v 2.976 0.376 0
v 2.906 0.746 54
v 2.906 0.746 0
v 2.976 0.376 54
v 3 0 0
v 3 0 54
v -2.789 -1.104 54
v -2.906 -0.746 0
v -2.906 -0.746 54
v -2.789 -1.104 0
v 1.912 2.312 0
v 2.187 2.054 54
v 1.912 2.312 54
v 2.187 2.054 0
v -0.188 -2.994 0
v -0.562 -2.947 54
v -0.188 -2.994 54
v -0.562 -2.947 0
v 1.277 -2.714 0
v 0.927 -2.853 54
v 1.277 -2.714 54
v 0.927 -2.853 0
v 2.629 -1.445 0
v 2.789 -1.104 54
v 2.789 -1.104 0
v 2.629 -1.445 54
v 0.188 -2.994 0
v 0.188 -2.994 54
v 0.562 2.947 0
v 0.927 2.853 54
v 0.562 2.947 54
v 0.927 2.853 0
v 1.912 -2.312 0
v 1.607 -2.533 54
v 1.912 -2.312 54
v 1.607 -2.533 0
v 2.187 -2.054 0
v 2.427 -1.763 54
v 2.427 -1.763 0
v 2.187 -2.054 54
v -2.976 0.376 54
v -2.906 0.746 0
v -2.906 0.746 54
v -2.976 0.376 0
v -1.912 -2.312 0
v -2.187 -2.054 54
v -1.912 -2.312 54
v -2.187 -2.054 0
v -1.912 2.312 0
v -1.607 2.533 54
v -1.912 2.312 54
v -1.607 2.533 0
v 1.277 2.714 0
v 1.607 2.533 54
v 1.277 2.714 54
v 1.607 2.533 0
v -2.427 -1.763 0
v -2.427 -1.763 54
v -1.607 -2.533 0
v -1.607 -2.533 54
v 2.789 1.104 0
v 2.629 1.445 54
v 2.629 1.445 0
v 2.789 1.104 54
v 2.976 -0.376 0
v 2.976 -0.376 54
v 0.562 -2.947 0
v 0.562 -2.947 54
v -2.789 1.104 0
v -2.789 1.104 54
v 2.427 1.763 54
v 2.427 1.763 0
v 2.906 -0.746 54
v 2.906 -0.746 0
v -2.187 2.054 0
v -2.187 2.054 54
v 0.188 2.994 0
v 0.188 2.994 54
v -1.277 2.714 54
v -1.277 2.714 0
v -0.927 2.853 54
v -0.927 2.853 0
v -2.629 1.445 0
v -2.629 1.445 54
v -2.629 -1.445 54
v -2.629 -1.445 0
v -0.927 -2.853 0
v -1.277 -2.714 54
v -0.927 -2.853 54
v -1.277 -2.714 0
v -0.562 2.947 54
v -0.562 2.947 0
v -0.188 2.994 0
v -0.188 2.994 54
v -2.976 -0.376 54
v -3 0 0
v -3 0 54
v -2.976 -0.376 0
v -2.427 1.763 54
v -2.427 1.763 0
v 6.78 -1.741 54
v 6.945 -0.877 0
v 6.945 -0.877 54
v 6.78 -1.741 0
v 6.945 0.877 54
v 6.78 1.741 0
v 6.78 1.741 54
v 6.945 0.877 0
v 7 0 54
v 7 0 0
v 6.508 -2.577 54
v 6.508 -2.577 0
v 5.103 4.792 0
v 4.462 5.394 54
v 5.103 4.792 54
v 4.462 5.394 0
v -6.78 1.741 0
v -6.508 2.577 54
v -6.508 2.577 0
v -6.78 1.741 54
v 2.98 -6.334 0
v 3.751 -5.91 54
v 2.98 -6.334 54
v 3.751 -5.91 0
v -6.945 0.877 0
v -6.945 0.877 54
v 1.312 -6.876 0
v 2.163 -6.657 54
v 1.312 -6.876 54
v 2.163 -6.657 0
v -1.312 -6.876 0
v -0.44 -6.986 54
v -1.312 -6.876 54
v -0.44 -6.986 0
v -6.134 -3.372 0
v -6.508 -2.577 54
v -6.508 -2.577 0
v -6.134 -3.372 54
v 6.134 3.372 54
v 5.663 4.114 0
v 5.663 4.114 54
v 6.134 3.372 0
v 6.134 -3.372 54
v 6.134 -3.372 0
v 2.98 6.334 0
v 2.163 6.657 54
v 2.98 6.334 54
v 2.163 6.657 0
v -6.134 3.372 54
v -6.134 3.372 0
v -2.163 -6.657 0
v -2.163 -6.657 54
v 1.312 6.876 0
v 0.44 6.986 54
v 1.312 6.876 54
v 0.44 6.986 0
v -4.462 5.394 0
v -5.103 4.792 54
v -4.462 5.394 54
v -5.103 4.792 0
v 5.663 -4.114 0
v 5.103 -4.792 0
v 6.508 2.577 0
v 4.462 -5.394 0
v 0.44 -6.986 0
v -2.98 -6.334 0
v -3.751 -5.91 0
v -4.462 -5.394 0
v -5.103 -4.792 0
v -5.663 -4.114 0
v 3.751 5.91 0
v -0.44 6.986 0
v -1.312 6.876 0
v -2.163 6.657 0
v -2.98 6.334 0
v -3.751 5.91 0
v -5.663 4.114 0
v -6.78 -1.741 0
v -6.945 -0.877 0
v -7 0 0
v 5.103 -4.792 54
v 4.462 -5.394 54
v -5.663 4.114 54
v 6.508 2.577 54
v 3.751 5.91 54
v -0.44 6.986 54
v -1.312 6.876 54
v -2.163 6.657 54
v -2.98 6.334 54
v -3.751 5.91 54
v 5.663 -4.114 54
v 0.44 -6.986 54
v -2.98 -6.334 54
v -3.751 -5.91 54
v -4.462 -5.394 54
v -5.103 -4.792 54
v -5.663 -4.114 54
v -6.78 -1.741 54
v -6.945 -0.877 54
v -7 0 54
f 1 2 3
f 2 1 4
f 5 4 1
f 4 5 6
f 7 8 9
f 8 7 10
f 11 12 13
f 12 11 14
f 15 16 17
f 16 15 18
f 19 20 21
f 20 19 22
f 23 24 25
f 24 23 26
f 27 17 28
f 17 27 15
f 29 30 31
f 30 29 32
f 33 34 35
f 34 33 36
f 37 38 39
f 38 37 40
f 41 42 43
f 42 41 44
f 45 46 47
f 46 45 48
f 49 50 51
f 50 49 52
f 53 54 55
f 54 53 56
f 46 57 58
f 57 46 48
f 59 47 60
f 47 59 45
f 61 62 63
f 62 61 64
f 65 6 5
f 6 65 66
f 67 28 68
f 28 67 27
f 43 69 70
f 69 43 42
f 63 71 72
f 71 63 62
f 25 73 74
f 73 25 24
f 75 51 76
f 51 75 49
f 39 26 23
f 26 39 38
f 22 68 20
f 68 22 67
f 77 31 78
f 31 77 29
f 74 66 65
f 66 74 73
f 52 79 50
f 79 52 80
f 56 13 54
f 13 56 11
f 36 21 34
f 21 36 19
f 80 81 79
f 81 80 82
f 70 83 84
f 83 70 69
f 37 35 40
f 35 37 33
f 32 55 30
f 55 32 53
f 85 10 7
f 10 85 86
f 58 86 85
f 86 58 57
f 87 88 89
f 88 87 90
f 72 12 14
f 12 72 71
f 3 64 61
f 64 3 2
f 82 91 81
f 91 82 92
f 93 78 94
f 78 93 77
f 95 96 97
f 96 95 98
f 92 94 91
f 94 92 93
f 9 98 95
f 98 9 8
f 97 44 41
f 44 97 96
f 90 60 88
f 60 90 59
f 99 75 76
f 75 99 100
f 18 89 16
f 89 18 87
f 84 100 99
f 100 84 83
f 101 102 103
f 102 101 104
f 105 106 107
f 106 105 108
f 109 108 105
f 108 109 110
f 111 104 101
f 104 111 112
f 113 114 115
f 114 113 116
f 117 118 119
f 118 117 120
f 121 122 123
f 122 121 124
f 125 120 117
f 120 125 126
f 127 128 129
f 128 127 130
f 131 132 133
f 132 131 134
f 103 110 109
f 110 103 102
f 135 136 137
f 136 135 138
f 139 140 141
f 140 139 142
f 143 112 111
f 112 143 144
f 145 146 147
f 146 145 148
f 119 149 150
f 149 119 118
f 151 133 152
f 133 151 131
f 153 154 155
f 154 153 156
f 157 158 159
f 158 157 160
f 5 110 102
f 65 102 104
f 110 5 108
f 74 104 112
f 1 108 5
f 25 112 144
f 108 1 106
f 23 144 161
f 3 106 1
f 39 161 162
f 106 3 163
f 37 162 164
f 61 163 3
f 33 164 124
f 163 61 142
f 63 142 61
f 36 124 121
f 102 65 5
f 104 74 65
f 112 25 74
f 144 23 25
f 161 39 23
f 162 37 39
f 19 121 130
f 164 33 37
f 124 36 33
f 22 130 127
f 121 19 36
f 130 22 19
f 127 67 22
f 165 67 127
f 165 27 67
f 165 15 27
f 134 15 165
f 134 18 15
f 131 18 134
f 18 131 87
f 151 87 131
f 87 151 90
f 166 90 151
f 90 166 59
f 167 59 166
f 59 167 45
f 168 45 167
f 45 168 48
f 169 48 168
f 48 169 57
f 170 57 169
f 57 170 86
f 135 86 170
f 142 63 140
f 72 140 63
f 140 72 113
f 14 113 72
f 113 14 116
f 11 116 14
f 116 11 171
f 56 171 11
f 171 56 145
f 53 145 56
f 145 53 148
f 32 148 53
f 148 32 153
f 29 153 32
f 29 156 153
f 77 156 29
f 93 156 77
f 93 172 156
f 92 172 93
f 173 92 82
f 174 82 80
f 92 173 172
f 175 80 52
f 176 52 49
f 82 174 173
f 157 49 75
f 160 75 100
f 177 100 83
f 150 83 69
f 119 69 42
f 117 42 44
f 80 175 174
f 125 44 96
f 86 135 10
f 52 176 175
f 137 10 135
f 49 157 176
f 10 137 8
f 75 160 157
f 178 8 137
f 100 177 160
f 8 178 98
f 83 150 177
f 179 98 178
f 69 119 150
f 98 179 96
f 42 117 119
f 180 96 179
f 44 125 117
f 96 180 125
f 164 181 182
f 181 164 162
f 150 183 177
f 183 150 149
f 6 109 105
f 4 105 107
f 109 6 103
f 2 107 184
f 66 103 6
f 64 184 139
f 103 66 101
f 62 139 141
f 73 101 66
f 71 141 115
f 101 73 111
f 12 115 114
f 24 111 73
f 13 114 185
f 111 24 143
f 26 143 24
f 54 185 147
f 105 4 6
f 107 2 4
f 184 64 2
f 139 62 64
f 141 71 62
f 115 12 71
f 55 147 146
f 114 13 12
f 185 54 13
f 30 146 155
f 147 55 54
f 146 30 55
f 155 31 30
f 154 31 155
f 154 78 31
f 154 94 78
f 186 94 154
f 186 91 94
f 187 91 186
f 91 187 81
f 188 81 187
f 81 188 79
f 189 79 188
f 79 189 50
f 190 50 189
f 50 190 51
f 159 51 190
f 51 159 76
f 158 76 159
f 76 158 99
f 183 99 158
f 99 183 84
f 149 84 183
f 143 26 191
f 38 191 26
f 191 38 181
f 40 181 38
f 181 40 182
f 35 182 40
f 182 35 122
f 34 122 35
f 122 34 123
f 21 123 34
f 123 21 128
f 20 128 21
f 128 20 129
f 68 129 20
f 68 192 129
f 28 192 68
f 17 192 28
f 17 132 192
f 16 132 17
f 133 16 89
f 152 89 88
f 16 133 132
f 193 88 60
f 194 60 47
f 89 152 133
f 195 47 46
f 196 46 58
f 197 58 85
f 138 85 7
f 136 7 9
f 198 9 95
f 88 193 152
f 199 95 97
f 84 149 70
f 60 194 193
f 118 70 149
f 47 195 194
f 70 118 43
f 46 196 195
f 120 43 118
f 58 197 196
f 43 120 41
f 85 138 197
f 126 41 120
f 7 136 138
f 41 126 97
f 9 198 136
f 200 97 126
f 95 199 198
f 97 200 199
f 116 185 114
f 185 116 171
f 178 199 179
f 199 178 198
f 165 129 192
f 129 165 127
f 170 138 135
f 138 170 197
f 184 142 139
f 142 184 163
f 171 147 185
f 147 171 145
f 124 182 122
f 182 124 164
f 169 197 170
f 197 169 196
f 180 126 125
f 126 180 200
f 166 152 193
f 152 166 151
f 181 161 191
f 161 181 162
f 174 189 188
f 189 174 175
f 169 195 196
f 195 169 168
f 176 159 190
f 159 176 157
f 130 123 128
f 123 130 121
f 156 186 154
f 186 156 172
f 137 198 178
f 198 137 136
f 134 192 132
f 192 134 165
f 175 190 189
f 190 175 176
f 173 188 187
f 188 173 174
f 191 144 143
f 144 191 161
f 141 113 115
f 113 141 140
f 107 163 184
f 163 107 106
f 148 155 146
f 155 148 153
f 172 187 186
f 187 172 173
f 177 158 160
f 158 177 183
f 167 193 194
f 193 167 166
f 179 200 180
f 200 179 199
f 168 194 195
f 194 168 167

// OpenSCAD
$fn = 50;

difference() {
	union() {
		cylinder(h = 54, r = 7.0);
	}
	union() {
		translate(v = [0, 0, -100]) {
			cylinder(h = 200, r = 3.0);
		}
		translate(v = [0, 0, -100]) {
			cylinder(h = 200, r = 1.5);
		}
	}
}
